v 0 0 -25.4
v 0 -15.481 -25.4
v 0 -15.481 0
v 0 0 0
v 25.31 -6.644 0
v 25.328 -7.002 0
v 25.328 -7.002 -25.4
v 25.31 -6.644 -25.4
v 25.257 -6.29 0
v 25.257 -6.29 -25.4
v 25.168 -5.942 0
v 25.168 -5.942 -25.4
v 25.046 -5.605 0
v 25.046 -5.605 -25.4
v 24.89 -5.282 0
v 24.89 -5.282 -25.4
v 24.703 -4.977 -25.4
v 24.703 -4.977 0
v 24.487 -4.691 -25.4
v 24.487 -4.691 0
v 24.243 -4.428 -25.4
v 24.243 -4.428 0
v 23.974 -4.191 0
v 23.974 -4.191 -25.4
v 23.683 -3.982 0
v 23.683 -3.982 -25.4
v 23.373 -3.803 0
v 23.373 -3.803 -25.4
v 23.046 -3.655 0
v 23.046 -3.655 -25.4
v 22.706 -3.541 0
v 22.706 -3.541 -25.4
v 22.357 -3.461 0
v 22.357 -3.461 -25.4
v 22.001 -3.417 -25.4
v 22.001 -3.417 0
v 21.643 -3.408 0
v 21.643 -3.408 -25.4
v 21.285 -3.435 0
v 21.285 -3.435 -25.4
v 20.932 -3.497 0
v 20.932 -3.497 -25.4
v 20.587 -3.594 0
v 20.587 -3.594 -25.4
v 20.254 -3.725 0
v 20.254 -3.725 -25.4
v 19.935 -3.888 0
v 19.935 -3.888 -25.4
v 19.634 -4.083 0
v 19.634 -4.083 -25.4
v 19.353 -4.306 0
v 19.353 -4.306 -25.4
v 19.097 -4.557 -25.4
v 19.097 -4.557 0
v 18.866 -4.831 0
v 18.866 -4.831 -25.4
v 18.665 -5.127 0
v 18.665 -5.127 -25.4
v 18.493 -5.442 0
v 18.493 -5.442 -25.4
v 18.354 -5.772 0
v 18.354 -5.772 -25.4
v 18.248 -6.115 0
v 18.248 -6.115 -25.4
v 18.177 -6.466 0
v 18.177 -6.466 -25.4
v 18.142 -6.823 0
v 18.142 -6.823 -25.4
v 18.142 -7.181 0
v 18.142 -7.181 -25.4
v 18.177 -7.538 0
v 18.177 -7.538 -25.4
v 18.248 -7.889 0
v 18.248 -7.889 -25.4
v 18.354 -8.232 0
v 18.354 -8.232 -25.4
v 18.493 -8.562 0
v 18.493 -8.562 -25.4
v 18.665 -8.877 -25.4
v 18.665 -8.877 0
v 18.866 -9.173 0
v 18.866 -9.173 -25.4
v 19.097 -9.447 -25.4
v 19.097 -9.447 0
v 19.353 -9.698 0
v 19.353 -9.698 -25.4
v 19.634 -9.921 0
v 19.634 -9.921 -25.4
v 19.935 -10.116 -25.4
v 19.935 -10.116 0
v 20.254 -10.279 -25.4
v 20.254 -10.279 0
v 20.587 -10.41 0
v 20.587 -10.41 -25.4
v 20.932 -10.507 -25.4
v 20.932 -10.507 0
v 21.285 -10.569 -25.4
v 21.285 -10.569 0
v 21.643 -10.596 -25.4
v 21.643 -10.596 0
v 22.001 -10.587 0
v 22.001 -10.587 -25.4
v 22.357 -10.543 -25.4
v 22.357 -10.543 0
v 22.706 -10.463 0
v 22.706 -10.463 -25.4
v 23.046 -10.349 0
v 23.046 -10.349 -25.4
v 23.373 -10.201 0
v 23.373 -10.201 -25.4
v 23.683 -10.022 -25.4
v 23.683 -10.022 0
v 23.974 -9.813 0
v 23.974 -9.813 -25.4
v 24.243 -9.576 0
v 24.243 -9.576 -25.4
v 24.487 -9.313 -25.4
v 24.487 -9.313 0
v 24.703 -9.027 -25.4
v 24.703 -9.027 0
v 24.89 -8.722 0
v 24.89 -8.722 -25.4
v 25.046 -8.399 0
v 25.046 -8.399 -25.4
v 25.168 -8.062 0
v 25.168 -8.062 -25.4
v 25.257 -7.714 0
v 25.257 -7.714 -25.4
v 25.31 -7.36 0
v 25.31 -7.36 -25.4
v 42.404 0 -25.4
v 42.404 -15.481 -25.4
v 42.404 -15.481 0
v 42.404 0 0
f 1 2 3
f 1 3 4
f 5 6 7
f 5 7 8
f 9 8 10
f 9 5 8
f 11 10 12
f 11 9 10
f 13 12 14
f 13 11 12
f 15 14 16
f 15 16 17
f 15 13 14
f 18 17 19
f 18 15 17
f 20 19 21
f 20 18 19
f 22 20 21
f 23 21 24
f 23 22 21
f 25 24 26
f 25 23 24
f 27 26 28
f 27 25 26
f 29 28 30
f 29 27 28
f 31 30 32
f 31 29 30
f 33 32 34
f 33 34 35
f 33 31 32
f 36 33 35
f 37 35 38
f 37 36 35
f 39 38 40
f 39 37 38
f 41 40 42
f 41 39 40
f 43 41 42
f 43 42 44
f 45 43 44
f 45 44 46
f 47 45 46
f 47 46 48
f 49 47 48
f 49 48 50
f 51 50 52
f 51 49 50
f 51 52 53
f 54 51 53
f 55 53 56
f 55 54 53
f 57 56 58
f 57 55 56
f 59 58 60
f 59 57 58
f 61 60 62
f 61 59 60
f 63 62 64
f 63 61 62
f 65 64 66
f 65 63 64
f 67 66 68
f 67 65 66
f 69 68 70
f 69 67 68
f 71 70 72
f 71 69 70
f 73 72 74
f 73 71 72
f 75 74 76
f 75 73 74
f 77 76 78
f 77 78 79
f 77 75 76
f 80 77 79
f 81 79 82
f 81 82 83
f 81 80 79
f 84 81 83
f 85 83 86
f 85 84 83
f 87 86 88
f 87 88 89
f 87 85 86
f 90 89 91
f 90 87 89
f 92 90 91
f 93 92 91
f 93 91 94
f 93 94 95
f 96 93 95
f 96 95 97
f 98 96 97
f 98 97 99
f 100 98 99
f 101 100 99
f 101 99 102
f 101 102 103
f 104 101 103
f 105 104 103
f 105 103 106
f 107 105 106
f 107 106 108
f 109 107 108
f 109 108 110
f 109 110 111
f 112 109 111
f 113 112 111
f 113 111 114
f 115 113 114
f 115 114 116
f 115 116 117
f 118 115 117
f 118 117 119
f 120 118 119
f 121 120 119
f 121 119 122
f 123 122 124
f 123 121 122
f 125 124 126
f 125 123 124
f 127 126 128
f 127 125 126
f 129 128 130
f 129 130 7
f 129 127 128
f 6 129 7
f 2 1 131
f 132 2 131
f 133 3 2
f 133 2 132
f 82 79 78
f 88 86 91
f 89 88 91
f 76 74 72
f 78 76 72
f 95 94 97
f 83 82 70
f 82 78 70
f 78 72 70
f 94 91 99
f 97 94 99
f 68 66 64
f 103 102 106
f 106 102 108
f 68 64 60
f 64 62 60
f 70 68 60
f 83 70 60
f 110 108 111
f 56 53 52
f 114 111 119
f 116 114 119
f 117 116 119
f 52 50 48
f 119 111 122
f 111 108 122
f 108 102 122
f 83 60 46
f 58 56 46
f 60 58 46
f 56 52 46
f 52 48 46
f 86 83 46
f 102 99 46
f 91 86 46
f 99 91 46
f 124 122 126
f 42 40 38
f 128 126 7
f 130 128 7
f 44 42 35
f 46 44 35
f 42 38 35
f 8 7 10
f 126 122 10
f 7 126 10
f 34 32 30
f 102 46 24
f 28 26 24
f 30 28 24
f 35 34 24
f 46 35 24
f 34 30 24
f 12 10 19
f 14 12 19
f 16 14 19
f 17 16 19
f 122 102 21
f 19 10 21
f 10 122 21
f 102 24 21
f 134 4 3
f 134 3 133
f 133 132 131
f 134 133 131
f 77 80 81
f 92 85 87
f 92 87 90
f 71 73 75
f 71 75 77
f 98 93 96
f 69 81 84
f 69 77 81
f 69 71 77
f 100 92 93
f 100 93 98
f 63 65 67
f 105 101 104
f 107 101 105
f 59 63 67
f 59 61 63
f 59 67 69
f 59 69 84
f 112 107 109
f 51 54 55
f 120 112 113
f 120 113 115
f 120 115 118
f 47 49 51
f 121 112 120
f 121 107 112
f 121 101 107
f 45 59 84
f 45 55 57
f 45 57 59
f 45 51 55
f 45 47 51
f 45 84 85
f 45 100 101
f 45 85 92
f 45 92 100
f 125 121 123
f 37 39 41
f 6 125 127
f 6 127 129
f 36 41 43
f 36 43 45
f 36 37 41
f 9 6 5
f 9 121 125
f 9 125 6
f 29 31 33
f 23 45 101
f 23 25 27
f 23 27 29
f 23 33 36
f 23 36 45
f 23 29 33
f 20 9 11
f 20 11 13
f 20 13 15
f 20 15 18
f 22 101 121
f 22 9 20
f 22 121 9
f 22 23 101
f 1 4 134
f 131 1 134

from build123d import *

# Parameters (mm, degrees)
F0_W           = 68.3668106794
F0_H           = 33.9986383915
F2_DEPTH       = 25.4
F3_D           = 6.35
F3_CBORE_D     = 7.62
F3_CBORE_DEPTH = 9.525
F5_D           = 19.05
F5_CBORE_D     = 25.4
F5_CBORE_DEPTH = 6.35
F8_R           = 3.595396078
F9_DEPTH       = 25.4
F7_W           = 42.4042865634
F7_H           = 15.4809802771


with BuildPart() as f2:
    # F0 (on Top) → F2 (new body)
    with BuildSketch(Plane.XY):
        with Locations((34.1834053397, -16.9993191957)):
            Rectangle(F0_W, F0_H)
    extrude(amount=-F2_DEPTH)

    # F3 (through all)
    with Locations(Plane.XY):
        with Locations((33.0153182149, -14.4990934059)):
            CounterBoreHole(F3_D / 2, F3_CBORE_D / 2, F3_CBORE_DEPTH)

    # F5 (through all)
    with Locations(Plane.XY):
        with Locations((33.0153182149, -14.4990934059)):
            CounterBoreHole(F5_D / 2, F5_CBORE_D / 2, F5_CBORE_DEPTH)


with BuildPart() as f9:
    # F8 (on face) → F9 (new body)
    with BuildSketch(Plane.XY):
        with Locations((21.7324774712, -7.0019960403)):
            Circle(F8_R)
    extrude(amount=-F9_DEPTH)


with BuildPart() as f9b:
    # F7 (on Top) → F9, piece 2 (new body)
    with BuildSketch(Plane.XY):
        with Locations((21.2021432817, -7.7404901385)):
            Rectangle(F7_W, F7_H)
    extrude(amount=-F9_DEPTH)


solid = Compound([f9.part, f9b.part])
